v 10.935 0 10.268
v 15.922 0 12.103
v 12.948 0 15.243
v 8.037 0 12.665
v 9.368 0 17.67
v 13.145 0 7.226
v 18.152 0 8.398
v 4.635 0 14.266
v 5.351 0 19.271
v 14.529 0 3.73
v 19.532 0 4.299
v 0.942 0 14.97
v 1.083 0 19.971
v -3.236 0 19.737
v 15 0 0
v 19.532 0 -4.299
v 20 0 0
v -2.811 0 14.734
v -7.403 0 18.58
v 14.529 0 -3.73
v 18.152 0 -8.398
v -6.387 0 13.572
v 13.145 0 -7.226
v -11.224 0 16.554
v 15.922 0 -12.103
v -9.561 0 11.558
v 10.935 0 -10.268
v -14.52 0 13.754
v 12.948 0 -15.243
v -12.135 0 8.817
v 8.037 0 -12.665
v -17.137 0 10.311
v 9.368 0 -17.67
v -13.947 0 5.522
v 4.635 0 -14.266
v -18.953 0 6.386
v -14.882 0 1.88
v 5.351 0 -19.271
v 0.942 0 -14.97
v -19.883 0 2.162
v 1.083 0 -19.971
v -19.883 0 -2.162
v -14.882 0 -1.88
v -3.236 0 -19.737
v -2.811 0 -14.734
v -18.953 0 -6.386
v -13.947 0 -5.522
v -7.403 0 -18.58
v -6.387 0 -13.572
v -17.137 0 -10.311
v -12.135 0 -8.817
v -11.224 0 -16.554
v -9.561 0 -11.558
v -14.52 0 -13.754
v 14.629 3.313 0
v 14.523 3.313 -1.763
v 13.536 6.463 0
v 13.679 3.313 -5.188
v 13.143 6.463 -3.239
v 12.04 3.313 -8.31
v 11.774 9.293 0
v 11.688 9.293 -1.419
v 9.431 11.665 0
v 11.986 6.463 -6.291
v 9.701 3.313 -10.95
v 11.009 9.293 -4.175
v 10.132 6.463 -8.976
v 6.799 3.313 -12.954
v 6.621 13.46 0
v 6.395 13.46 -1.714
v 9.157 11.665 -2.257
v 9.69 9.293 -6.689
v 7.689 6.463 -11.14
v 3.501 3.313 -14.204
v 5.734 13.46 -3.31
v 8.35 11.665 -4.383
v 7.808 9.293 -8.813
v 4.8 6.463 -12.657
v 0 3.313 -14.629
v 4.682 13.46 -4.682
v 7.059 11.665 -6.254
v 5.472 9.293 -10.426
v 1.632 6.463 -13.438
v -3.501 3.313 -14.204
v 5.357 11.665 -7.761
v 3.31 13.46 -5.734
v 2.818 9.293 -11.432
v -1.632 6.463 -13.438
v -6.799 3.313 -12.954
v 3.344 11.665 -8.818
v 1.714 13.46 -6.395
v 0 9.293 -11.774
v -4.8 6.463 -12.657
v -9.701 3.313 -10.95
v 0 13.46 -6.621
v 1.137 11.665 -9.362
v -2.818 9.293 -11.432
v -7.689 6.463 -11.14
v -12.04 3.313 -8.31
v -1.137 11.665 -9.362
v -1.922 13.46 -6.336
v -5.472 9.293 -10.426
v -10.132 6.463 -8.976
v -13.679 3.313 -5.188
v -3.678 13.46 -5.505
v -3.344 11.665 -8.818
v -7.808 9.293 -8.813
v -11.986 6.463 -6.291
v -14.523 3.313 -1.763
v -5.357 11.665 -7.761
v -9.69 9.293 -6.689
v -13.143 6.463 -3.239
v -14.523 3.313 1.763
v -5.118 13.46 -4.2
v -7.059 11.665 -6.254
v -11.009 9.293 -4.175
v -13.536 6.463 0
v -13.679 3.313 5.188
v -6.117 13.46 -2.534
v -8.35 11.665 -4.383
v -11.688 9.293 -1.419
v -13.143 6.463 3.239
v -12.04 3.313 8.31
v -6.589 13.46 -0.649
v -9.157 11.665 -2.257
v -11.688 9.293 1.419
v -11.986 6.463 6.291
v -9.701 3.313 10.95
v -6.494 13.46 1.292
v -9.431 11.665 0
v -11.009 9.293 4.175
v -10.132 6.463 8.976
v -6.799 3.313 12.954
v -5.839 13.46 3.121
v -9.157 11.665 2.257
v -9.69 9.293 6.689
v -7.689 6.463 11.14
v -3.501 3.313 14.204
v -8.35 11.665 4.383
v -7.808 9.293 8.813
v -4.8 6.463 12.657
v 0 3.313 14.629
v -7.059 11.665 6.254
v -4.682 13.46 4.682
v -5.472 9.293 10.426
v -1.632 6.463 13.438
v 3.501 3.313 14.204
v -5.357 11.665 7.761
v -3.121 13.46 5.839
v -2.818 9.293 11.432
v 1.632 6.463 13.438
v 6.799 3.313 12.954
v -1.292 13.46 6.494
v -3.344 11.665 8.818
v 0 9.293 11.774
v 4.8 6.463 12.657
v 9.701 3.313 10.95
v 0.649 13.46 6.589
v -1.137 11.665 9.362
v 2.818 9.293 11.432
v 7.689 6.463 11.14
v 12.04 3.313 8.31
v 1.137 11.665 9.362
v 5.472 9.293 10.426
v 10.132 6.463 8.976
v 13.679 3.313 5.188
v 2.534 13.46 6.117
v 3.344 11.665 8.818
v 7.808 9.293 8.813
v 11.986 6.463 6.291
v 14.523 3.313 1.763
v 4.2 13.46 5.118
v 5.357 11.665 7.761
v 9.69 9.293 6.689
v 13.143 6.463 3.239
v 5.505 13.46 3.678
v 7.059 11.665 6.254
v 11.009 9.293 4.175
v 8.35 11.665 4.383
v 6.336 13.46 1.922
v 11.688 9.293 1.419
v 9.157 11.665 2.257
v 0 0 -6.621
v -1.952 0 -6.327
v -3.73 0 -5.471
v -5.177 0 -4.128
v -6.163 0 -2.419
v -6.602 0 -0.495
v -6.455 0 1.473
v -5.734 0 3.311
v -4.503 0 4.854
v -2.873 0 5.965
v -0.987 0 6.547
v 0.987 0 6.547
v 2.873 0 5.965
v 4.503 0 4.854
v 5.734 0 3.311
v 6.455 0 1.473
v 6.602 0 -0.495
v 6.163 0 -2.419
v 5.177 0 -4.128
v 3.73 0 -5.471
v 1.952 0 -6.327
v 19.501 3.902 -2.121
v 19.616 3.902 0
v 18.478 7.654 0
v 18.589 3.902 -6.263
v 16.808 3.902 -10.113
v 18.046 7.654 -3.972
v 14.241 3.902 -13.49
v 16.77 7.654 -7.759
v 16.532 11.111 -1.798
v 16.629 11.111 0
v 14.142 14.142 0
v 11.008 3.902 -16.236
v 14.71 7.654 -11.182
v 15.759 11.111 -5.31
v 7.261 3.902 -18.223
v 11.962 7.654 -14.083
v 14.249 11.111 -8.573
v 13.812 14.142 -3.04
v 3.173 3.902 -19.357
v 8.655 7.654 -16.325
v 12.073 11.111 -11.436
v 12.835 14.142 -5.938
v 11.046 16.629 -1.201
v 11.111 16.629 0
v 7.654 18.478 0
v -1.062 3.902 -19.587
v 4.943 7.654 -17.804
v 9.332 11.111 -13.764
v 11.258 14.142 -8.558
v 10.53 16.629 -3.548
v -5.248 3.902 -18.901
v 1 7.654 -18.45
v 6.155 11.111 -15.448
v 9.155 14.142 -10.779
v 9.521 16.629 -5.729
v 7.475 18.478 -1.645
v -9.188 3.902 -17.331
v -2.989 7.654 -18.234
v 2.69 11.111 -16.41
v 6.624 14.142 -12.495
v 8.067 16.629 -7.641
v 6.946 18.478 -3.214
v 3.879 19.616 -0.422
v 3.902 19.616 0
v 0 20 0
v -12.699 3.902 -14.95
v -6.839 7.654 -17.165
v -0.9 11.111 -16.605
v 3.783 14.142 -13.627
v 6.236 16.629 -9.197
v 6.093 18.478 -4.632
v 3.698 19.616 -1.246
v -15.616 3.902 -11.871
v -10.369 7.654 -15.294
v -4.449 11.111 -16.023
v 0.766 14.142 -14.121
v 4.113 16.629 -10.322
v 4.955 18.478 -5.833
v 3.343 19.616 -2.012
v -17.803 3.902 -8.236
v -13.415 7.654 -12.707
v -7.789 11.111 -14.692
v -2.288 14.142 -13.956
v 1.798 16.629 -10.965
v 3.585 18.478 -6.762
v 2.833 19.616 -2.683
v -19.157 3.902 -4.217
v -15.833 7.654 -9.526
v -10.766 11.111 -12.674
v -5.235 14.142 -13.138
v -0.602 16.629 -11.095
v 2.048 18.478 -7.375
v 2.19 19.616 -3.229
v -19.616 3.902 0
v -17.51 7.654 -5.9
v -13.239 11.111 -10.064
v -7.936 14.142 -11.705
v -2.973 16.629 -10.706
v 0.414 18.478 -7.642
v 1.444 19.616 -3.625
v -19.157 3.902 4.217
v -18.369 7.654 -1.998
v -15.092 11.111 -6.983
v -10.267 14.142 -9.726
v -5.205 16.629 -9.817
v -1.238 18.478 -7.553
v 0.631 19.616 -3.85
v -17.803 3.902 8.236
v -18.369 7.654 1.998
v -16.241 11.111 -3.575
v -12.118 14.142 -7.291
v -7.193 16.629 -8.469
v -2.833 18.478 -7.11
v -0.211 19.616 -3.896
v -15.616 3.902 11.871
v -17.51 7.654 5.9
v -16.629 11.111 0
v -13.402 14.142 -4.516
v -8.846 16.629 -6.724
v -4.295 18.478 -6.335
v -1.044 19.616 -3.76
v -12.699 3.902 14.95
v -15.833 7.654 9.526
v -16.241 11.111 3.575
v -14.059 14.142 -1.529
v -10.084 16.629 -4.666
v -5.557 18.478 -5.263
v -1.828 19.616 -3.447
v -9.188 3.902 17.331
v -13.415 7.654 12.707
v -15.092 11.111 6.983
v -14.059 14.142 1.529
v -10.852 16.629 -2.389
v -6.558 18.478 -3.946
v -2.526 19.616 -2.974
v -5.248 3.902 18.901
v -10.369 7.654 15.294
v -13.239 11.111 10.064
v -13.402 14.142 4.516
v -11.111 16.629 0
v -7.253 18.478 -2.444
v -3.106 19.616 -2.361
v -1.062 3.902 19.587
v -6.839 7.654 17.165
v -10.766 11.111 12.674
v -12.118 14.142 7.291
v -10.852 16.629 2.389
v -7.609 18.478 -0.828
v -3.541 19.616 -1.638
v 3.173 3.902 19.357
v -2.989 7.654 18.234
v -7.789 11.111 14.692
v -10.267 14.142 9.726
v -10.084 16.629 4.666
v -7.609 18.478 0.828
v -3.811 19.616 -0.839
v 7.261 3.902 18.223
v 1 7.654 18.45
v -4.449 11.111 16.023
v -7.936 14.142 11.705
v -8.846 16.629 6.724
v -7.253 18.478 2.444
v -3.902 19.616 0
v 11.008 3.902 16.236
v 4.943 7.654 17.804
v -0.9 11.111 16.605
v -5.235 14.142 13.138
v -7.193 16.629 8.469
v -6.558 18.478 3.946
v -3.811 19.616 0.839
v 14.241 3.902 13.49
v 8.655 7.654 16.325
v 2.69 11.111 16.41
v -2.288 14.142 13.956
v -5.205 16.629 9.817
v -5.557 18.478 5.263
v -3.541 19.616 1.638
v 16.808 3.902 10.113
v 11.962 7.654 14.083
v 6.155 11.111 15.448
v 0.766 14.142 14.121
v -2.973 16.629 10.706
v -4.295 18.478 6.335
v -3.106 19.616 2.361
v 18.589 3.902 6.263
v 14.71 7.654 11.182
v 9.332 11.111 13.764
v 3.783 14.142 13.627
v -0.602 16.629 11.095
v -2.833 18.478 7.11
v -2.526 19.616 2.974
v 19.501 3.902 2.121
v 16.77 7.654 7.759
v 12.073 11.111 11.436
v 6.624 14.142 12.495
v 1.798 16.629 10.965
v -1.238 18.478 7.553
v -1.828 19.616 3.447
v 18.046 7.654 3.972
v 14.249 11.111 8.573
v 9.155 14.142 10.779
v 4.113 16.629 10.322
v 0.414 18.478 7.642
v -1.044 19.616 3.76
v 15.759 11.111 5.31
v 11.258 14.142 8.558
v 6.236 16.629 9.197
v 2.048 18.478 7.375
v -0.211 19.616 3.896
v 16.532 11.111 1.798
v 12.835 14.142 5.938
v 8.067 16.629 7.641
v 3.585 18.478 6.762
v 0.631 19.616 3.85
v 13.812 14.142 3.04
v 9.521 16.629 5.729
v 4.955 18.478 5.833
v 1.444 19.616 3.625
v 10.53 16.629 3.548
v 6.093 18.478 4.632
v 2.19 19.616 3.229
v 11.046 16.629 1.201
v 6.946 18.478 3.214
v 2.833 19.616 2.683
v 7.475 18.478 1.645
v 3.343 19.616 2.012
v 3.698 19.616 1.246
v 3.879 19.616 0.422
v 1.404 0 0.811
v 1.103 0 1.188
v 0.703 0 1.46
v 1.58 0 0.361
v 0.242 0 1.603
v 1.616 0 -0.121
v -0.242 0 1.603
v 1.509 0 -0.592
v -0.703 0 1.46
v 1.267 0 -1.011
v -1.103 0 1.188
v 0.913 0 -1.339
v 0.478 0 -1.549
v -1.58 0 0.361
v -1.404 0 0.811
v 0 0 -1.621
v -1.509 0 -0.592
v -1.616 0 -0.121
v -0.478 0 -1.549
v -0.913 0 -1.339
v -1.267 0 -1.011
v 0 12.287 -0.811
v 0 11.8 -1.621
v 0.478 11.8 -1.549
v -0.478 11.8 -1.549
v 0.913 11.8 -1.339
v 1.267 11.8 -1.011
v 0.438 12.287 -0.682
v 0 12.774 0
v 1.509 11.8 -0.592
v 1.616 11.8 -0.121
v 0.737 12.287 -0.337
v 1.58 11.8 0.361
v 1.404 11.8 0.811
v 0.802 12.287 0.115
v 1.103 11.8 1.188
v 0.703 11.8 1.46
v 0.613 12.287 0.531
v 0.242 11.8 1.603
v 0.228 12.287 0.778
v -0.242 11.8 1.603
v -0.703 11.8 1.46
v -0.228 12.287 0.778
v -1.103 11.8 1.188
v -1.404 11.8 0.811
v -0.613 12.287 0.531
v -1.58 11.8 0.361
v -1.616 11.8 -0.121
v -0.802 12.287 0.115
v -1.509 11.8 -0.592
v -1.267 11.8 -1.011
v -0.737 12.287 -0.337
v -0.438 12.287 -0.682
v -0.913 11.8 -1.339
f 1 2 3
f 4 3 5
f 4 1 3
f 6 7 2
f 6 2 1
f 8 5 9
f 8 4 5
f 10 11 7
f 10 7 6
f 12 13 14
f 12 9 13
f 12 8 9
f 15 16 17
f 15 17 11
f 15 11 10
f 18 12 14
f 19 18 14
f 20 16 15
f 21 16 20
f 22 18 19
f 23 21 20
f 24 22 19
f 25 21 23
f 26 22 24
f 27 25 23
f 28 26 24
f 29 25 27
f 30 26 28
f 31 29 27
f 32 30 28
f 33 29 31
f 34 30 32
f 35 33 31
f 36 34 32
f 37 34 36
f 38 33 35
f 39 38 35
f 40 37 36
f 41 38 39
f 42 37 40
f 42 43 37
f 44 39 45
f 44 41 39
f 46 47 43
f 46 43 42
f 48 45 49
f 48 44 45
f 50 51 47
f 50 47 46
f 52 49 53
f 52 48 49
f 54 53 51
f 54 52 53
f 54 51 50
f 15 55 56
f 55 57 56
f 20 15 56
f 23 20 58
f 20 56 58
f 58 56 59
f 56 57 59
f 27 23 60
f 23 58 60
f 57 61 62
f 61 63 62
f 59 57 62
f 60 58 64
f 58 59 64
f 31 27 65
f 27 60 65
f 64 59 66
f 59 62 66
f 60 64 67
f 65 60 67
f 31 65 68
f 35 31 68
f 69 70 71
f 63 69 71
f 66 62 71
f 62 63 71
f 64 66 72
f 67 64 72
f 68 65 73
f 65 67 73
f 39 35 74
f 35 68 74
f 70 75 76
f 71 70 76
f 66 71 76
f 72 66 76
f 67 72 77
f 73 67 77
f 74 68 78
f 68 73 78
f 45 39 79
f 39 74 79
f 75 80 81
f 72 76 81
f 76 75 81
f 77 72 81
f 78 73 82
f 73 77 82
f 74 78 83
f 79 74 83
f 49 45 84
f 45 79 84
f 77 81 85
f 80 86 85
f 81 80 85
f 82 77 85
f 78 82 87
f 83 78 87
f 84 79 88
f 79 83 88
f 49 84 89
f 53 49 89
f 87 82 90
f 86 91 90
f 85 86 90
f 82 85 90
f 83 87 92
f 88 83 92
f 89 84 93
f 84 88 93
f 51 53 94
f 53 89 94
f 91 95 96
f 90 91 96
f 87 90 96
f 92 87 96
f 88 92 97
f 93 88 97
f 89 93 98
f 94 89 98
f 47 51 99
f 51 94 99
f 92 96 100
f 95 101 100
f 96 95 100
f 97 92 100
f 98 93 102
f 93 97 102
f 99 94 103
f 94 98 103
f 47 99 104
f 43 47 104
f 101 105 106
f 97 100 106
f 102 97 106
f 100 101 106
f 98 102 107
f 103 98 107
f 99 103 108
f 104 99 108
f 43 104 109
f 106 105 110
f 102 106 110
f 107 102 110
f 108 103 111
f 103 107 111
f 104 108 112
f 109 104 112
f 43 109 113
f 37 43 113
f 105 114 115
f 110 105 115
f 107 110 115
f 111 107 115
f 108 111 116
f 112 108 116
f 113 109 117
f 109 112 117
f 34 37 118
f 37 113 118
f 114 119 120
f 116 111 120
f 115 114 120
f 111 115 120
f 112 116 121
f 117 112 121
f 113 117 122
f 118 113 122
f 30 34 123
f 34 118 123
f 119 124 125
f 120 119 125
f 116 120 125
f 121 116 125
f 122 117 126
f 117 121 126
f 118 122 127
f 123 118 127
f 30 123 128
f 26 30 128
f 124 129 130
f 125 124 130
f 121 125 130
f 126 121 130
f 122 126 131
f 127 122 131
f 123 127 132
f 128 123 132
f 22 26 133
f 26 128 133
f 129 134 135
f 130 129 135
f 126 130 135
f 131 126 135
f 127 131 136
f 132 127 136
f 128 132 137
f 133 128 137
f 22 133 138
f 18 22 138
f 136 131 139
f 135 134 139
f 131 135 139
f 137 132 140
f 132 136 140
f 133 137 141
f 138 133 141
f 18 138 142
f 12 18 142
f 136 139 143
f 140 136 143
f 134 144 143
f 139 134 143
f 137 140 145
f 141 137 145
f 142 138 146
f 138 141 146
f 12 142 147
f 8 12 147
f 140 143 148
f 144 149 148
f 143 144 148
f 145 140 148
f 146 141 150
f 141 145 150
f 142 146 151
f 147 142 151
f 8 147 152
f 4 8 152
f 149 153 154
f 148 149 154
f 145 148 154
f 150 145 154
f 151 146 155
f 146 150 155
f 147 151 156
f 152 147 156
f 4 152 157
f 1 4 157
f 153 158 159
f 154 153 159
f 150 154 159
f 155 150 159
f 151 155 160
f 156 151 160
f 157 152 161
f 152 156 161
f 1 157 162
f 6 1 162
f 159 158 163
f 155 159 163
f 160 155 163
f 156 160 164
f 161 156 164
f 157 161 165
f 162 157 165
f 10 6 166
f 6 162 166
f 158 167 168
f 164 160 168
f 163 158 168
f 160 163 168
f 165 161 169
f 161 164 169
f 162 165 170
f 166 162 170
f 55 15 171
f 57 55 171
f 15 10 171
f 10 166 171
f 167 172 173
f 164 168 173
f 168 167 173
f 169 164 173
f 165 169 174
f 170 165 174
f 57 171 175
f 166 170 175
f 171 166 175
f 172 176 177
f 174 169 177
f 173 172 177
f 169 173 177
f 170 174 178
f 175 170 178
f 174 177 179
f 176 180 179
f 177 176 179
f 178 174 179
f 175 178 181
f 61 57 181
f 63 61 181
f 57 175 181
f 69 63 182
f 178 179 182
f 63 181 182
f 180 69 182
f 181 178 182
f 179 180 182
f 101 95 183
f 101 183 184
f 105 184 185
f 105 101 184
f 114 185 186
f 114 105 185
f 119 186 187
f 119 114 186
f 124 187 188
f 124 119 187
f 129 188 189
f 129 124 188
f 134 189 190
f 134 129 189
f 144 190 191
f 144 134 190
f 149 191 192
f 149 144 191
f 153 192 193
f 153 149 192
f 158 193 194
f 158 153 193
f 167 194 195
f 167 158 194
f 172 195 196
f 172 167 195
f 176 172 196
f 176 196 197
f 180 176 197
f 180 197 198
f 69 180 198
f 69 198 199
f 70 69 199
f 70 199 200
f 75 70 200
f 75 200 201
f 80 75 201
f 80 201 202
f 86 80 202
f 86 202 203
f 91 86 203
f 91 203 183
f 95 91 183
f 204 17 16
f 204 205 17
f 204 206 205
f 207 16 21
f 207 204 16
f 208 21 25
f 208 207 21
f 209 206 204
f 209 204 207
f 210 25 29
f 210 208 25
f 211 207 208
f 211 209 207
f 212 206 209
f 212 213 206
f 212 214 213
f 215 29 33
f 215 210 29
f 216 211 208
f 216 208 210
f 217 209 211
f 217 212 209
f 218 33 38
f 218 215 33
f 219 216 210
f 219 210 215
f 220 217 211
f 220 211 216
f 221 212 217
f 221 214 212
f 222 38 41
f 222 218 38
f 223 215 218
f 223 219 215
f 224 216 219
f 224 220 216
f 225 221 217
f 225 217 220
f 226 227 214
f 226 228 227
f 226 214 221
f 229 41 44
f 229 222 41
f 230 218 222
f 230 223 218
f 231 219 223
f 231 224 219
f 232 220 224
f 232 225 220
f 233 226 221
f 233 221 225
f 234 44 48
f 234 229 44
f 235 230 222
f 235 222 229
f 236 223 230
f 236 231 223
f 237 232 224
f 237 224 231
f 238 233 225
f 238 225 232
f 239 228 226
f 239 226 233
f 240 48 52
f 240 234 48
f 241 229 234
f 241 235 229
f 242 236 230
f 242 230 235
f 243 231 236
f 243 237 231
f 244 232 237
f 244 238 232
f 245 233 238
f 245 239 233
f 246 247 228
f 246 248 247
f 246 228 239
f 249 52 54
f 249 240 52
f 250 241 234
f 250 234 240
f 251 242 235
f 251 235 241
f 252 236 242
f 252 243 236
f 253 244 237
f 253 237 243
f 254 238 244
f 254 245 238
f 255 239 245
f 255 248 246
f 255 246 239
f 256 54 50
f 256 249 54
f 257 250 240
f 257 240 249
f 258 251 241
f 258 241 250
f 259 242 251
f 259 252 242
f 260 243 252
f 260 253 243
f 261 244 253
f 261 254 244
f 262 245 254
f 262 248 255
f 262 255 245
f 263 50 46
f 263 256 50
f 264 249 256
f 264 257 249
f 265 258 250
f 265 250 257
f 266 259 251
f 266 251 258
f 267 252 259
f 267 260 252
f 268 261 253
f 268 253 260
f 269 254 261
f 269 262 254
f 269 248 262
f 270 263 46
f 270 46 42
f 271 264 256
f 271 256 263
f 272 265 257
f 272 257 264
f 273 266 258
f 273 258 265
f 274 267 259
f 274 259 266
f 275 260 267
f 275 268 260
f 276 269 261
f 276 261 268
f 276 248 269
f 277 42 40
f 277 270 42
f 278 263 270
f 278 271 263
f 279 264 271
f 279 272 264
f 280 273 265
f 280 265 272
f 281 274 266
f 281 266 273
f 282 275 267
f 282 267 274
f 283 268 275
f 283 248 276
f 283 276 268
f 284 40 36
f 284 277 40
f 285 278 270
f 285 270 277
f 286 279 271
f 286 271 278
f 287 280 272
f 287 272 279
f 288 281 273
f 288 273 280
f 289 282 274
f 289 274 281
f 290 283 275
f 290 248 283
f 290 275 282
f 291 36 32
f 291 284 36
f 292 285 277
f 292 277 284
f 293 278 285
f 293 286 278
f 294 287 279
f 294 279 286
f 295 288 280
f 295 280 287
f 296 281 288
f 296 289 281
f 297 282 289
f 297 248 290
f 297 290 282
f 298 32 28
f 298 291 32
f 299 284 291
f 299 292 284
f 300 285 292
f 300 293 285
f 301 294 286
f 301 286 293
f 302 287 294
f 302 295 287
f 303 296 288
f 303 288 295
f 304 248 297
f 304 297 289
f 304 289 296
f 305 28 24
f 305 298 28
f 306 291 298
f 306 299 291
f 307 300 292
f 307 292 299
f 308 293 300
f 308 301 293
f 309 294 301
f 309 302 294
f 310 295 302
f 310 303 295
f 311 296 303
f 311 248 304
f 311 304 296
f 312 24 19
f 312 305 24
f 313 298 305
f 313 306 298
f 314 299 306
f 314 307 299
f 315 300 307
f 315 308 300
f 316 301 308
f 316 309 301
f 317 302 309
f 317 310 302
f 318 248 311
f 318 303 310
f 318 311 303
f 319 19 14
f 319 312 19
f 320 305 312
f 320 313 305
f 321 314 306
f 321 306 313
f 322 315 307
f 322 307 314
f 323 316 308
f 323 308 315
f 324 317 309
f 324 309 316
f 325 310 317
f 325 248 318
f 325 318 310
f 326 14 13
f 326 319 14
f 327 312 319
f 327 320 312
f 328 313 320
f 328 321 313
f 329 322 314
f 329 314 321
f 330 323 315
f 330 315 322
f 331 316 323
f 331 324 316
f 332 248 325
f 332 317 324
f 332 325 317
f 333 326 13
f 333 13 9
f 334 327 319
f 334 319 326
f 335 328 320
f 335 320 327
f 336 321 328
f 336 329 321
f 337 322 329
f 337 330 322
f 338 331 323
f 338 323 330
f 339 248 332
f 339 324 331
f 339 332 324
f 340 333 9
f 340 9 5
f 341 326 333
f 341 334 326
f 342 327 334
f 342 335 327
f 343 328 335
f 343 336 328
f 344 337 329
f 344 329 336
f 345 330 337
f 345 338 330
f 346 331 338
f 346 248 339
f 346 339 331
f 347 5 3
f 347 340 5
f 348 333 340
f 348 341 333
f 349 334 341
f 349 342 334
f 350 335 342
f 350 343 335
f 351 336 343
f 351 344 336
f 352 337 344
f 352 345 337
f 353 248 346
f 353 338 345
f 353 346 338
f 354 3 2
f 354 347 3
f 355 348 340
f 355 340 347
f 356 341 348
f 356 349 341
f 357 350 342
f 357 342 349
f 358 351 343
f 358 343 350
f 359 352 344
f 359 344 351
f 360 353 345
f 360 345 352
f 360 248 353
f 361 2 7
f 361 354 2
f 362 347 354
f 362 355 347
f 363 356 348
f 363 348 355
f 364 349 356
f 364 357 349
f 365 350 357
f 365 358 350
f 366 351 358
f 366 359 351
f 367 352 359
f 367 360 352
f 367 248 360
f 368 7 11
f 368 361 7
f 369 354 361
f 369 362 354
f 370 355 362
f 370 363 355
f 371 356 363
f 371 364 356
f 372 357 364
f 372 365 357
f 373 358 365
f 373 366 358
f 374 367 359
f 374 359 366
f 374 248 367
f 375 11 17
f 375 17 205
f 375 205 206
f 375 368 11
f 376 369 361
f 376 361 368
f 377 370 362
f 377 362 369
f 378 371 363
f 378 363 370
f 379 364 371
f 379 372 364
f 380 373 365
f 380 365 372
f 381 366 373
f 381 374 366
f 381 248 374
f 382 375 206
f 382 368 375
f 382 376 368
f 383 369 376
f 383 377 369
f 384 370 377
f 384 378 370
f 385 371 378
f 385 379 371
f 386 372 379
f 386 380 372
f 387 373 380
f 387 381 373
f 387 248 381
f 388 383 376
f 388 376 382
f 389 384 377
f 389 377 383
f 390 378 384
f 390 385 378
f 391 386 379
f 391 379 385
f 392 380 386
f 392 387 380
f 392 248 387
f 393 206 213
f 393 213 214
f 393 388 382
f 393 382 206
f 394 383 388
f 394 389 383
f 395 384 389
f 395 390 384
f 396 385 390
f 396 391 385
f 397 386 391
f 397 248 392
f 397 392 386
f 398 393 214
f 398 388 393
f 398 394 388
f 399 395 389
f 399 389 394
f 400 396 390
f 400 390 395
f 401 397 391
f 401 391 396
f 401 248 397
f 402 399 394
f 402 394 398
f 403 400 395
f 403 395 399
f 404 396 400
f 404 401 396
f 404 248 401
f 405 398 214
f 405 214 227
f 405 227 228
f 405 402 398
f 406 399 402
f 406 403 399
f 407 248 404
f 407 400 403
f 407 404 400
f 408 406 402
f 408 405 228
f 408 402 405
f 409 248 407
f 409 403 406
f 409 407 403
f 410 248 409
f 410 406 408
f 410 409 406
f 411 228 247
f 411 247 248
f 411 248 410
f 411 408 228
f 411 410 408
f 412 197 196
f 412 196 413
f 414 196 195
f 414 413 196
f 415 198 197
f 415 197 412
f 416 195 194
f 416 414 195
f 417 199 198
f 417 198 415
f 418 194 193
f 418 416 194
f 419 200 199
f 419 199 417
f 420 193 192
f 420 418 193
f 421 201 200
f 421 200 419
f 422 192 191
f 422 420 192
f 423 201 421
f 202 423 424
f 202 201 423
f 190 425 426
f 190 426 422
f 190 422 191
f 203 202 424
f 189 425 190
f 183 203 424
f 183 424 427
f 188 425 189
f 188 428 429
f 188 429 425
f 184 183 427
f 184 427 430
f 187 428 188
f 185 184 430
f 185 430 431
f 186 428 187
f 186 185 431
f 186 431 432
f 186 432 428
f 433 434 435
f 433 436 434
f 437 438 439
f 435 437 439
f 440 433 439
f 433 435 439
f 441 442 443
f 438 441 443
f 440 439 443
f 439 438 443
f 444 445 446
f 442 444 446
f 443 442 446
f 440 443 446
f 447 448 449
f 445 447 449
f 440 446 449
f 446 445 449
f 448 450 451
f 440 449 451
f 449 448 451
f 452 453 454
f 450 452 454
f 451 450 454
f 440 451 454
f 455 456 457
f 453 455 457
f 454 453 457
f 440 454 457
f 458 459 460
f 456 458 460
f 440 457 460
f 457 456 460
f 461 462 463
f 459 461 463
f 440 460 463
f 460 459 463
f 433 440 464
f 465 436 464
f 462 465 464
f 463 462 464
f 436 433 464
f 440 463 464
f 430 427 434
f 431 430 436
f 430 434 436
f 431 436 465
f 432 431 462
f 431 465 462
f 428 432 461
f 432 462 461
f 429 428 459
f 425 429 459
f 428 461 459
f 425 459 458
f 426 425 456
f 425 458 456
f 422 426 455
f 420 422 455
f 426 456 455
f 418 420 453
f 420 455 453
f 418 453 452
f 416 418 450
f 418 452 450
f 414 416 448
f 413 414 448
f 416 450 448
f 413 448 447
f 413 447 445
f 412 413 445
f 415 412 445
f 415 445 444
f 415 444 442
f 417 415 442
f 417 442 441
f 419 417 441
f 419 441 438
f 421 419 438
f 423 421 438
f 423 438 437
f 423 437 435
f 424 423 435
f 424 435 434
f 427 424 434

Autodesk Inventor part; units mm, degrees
ref_plane "YZ Plane" through (0, 0, 0) normal (1, 0, 0) x (0, 1, 0)
ref_plane "XZ Plane" through (0, 0, 0) normal (0, 1, 0) x (-1, 0, 0)
ref_plane "XY Plane" through (0, 0, 0) normal (0, 0, 1) x (1, 0, 0)
sketch "Sketch1" plane through (0, 0, 0) normal (0, 0, 1) x (1, 0, 0)
  line L0 (0, 0) -> (0, 20)
  line L1 (0, 0) -> (20, 0)
  arc A0 (20, 0) -> (0, 20) centre (0, 0) ccw
  line L2 (0, -4.8284) -> (0, 28.9706) projected
  dimension "d2" = 20
revolve "Revolution1" add sketch "Sketch1" angle 360 about axis through (0, -10, 0) along (0, 1, 0)
sketch "Sketch4" plane through (0, 0, 0) normal (0, -1, 0) x (1, 0, 0)
  point P0 (0, 0)
  point P1 (0, 0)
hole "Hole2" at (0, 0, 0) direction (0, 1, 0) diameter 3.242 depth 11.8 tip angle 118 thread size "M4x0.7" class "6H" standard "ANSI Metric M Profile"
shell "Shell2" thickness 5 removed faces 1 at (13.676, 0, 1.6606)
properties part number "Ball_Upper Half" material "Nylon 6/6"
